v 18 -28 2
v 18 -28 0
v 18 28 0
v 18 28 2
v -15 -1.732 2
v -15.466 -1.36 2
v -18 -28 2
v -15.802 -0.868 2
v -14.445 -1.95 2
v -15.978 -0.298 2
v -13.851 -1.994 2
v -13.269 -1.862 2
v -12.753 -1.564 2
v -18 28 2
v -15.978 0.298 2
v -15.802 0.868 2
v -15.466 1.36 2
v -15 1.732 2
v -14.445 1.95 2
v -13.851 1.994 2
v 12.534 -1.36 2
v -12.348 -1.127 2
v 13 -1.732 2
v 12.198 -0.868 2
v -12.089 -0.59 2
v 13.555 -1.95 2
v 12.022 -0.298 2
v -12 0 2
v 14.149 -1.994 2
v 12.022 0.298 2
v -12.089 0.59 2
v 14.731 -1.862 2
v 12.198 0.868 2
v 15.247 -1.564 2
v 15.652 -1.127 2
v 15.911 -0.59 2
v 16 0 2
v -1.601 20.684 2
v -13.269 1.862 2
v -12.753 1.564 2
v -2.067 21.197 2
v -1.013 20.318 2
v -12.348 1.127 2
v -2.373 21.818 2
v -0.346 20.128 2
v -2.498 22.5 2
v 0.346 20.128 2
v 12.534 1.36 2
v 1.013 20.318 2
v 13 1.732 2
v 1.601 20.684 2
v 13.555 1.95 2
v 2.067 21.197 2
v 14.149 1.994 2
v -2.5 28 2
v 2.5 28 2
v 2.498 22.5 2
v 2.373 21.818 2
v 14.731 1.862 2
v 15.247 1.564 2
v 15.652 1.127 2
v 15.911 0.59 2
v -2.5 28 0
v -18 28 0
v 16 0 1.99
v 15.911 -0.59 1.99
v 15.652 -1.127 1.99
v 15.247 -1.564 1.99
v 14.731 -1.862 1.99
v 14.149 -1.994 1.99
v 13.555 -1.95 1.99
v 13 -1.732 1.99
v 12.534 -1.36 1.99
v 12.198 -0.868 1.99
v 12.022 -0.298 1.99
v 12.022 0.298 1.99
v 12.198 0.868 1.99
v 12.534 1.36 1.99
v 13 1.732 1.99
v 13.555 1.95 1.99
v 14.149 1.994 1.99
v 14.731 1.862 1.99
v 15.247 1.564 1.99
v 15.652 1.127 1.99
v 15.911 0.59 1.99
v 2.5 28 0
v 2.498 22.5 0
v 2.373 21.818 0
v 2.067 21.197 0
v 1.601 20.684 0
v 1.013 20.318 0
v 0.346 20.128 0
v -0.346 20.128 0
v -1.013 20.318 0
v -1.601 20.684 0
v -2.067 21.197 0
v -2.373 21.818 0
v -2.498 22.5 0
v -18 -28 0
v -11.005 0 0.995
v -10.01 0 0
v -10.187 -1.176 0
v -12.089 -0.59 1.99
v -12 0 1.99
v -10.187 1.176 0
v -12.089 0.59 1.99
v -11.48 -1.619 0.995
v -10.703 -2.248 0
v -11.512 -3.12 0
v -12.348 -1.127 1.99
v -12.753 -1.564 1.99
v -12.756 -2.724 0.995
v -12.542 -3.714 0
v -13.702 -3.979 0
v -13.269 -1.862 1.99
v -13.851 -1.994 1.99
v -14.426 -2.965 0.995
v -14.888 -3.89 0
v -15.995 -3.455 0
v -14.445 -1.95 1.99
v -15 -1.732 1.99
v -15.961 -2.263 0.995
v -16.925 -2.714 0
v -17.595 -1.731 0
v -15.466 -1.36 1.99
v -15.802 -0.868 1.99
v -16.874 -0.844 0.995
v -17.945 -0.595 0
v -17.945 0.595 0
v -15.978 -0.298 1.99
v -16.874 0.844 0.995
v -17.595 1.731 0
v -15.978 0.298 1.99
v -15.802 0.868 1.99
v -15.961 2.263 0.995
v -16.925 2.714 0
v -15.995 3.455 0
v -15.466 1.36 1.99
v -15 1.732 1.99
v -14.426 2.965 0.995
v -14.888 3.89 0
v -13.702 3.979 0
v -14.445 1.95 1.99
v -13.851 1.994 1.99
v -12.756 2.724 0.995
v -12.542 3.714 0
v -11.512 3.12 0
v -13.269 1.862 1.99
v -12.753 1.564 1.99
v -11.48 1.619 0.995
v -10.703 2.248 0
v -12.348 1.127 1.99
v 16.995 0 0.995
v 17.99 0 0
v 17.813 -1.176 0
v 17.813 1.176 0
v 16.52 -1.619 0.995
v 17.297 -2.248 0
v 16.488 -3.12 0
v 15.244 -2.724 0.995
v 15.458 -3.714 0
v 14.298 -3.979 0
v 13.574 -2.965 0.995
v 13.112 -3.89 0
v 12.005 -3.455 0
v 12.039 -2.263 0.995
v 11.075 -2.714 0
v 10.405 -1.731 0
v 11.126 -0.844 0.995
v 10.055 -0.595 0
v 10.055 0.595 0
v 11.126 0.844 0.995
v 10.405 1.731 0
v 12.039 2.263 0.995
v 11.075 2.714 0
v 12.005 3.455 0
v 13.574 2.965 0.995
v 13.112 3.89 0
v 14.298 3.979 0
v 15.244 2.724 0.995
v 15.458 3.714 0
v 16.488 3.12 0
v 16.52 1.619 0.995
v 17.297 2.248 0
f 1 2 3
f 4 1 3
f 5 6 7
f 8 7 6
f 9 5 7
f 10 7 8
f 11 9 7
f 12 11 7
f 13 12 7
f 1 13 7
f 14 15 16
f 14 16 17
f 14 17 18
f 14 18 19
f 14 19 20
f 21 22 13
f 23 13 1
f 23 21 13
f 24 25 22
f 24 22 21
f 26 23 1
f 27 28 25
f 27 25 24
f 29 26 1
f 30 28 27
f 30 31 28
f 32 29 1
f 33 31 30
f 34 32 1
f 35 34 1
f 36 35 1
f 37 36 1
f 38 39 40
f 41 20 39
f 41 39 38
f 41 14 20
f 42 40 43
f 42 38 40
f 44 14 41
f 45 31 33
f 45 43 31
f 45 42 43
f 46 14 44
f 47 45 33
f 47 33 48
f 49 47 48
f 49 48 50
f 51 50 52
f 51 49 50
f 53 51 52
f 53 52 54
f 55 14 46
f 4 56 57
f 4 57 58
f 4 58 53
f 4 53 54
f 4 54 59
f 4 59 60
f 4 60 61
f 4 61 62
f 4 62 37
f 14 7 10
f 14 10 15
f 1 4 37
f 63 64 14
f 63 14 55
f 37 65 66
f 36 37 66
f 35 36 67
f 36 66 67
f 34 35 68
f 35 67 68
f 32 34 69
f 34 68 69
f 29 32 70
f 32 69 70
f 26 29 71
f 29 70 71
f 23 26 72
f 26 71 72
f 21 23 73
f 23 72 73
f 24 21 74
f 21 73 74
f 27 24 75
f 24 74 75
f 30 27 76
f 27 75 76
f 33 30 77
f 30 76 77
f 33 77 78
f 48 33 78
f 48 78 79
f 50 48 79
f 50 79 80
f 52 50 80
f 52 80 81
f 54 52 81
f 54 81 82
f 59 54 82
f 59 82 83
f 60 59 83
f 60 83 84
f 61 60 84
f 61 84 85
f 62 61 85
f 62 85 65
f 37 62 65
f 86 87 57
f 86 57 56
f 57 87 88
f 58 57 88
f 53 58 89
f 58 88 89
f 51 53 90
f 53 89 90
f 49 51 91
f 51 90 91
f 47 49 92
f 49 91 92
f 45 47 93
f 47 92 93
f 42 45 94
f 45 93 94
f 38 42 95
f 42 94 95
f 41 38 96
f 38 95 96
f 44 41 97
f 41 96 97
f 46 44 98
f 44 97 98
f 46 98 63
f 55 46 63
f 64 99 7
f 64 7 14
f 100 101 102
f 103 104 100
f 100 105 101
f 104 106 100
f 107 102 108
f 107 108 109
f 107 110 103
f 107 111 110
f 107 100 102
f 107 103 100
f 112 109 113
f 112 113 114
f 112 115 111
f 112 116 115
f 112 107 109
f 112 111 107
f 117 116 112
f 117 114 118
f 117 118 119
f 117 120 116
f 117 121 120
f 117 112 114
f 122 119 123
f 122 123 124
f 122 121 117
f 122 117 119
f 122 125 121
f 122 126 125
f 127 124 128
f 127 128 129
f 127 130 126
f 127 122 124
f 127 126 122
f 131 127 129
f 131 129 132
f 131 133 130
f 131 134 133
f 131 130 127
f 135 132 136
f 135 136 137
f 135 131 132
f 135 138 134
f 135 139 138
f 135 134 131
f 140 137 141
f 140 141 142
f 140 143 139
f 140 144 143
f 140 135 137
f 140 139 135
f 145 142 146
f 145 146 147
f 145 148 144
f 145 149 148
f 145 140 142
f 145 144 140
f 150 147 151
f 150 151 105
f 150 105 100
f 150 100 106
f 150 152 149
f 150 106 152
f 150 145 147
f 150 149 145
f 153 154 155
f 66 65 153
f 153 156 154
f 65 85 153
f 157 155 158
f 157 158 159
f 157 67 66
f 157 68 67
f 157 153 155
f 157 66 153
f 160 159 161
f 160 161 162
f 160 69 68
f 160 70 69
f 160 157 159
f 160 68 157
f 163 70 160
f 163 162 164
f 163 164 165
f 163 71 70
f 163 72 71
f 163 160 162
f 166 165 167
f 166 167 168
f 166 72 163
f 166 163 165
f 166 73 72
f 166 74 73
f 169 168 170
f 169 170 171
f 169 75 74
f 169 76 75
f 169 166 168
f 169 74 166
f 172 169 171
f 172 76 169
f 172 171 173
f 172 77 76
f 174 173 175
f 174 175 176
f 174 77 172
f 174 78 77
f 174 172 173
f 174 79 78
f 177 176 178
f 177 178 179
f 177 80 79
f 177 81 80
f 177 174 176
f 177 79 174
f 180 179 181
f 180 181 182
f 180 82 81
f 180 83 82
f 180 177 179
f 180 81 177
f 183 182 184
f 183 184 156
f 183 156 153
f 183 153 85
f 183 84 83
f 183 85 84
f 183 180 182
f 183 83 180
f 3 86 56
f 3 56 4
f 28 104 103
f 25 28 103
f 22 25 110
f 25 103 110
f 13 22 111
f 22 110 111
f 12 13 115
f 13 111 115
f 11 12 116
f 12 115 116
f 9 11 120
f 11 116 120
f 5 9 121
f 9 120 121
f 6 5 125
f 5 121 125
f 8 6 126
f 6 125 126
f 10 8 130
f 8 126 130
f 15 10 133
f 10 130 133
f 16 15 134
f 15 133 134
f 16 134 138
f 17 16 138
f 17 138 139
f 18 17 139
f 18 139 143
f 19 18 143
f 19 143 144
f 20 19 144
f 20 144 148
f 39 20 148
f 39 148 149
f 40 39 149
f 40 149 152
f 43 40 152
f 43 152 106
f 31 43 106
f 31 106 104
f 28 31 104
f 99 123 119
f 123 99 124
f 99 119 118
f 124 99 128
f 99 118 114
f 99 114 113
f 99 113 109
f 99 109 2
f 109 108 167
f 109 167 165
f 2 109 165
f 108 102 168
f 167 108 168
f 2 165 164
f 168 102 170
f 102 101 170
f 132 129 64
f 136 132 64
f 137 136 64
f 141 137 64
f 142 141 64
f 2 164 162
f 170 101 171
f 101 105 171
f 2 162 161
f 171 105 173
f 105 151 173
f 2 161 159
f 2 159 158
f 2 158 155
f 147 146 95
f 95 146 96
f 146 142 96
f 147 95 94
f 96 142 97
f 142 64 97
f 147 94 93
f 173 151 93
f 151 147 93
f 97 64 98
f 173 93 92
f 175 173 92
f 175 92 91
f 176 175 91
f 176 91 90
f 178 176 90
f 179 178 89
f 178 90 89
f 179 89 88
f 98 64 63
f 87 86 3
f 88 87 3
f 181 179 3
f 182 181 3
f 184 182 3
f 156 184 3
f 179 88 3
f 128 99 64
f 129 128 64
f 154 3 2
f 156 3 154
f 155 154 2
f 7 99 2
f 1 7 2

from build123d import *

# Parameters (mm, degrees)
SKETCH_W        = 36
SKETCH_H        = 56
PAD_DEPTH       = 2
SKETCH001_R     = 2
POCKET_DEPTH    = 3
CHAMFER_SIZE    = 1.99
POCKET001_DEPTH = 3


with BuildPart() as part:
    # Sketch → Pad (new body)
    with BuildSketch(Plane.XY):
        Rectangle(SKETCH_W, SKETCH_H)
    extrude(amount=PAD_DEPTH)

    # Sketch001 (on Face5 of Pad) → Pocket (cut)
    with BuildSketch(Plane(origin=(0, 0, 0), x_dir=(1, 0, 0), z_dir=(0, 0, -1))):
        with Locations((14, 0)):
            Circle(SKETCH001_R)
        with Locations((-14, 0)):
            Circle(SKETCH001_R)
    extrude(amount=-POCKET_DEPTH, mode=Mode.SUBTRACT)

    # Chamfer
    chamfer_edges = [part.edges().sort_by_distance(p)[0] for p in [
        (-16, 0, 0),
        (12, 0, 0),
    ]]
    chamfer(chamfer_edges, length=CHAMFER_SIZE)

    # Sketch002 (on Face1 of Chamfer) → Pocket001 (cut)
    with BuildSketch(Plane(origin=(0, 0, 0), x_dir=(1, 0, 0), z_dir=(0, 0, -1))):
        with BuildLine():
            ThreePointArc((2.49784, -22.5), (0, -20.103904), (-2.49784, -22.5))
            Line((-2.49784, -22.5), (-2.5, -28))
            Line((-2.5, -28), (2.5, -28))
            Line((2.49784, -22.5), (2.5, -28))
        make_face()
    extrude(amount=-POCKET001_DEPTH, mode=Mode.SUBTRACT)


solid = part.part
